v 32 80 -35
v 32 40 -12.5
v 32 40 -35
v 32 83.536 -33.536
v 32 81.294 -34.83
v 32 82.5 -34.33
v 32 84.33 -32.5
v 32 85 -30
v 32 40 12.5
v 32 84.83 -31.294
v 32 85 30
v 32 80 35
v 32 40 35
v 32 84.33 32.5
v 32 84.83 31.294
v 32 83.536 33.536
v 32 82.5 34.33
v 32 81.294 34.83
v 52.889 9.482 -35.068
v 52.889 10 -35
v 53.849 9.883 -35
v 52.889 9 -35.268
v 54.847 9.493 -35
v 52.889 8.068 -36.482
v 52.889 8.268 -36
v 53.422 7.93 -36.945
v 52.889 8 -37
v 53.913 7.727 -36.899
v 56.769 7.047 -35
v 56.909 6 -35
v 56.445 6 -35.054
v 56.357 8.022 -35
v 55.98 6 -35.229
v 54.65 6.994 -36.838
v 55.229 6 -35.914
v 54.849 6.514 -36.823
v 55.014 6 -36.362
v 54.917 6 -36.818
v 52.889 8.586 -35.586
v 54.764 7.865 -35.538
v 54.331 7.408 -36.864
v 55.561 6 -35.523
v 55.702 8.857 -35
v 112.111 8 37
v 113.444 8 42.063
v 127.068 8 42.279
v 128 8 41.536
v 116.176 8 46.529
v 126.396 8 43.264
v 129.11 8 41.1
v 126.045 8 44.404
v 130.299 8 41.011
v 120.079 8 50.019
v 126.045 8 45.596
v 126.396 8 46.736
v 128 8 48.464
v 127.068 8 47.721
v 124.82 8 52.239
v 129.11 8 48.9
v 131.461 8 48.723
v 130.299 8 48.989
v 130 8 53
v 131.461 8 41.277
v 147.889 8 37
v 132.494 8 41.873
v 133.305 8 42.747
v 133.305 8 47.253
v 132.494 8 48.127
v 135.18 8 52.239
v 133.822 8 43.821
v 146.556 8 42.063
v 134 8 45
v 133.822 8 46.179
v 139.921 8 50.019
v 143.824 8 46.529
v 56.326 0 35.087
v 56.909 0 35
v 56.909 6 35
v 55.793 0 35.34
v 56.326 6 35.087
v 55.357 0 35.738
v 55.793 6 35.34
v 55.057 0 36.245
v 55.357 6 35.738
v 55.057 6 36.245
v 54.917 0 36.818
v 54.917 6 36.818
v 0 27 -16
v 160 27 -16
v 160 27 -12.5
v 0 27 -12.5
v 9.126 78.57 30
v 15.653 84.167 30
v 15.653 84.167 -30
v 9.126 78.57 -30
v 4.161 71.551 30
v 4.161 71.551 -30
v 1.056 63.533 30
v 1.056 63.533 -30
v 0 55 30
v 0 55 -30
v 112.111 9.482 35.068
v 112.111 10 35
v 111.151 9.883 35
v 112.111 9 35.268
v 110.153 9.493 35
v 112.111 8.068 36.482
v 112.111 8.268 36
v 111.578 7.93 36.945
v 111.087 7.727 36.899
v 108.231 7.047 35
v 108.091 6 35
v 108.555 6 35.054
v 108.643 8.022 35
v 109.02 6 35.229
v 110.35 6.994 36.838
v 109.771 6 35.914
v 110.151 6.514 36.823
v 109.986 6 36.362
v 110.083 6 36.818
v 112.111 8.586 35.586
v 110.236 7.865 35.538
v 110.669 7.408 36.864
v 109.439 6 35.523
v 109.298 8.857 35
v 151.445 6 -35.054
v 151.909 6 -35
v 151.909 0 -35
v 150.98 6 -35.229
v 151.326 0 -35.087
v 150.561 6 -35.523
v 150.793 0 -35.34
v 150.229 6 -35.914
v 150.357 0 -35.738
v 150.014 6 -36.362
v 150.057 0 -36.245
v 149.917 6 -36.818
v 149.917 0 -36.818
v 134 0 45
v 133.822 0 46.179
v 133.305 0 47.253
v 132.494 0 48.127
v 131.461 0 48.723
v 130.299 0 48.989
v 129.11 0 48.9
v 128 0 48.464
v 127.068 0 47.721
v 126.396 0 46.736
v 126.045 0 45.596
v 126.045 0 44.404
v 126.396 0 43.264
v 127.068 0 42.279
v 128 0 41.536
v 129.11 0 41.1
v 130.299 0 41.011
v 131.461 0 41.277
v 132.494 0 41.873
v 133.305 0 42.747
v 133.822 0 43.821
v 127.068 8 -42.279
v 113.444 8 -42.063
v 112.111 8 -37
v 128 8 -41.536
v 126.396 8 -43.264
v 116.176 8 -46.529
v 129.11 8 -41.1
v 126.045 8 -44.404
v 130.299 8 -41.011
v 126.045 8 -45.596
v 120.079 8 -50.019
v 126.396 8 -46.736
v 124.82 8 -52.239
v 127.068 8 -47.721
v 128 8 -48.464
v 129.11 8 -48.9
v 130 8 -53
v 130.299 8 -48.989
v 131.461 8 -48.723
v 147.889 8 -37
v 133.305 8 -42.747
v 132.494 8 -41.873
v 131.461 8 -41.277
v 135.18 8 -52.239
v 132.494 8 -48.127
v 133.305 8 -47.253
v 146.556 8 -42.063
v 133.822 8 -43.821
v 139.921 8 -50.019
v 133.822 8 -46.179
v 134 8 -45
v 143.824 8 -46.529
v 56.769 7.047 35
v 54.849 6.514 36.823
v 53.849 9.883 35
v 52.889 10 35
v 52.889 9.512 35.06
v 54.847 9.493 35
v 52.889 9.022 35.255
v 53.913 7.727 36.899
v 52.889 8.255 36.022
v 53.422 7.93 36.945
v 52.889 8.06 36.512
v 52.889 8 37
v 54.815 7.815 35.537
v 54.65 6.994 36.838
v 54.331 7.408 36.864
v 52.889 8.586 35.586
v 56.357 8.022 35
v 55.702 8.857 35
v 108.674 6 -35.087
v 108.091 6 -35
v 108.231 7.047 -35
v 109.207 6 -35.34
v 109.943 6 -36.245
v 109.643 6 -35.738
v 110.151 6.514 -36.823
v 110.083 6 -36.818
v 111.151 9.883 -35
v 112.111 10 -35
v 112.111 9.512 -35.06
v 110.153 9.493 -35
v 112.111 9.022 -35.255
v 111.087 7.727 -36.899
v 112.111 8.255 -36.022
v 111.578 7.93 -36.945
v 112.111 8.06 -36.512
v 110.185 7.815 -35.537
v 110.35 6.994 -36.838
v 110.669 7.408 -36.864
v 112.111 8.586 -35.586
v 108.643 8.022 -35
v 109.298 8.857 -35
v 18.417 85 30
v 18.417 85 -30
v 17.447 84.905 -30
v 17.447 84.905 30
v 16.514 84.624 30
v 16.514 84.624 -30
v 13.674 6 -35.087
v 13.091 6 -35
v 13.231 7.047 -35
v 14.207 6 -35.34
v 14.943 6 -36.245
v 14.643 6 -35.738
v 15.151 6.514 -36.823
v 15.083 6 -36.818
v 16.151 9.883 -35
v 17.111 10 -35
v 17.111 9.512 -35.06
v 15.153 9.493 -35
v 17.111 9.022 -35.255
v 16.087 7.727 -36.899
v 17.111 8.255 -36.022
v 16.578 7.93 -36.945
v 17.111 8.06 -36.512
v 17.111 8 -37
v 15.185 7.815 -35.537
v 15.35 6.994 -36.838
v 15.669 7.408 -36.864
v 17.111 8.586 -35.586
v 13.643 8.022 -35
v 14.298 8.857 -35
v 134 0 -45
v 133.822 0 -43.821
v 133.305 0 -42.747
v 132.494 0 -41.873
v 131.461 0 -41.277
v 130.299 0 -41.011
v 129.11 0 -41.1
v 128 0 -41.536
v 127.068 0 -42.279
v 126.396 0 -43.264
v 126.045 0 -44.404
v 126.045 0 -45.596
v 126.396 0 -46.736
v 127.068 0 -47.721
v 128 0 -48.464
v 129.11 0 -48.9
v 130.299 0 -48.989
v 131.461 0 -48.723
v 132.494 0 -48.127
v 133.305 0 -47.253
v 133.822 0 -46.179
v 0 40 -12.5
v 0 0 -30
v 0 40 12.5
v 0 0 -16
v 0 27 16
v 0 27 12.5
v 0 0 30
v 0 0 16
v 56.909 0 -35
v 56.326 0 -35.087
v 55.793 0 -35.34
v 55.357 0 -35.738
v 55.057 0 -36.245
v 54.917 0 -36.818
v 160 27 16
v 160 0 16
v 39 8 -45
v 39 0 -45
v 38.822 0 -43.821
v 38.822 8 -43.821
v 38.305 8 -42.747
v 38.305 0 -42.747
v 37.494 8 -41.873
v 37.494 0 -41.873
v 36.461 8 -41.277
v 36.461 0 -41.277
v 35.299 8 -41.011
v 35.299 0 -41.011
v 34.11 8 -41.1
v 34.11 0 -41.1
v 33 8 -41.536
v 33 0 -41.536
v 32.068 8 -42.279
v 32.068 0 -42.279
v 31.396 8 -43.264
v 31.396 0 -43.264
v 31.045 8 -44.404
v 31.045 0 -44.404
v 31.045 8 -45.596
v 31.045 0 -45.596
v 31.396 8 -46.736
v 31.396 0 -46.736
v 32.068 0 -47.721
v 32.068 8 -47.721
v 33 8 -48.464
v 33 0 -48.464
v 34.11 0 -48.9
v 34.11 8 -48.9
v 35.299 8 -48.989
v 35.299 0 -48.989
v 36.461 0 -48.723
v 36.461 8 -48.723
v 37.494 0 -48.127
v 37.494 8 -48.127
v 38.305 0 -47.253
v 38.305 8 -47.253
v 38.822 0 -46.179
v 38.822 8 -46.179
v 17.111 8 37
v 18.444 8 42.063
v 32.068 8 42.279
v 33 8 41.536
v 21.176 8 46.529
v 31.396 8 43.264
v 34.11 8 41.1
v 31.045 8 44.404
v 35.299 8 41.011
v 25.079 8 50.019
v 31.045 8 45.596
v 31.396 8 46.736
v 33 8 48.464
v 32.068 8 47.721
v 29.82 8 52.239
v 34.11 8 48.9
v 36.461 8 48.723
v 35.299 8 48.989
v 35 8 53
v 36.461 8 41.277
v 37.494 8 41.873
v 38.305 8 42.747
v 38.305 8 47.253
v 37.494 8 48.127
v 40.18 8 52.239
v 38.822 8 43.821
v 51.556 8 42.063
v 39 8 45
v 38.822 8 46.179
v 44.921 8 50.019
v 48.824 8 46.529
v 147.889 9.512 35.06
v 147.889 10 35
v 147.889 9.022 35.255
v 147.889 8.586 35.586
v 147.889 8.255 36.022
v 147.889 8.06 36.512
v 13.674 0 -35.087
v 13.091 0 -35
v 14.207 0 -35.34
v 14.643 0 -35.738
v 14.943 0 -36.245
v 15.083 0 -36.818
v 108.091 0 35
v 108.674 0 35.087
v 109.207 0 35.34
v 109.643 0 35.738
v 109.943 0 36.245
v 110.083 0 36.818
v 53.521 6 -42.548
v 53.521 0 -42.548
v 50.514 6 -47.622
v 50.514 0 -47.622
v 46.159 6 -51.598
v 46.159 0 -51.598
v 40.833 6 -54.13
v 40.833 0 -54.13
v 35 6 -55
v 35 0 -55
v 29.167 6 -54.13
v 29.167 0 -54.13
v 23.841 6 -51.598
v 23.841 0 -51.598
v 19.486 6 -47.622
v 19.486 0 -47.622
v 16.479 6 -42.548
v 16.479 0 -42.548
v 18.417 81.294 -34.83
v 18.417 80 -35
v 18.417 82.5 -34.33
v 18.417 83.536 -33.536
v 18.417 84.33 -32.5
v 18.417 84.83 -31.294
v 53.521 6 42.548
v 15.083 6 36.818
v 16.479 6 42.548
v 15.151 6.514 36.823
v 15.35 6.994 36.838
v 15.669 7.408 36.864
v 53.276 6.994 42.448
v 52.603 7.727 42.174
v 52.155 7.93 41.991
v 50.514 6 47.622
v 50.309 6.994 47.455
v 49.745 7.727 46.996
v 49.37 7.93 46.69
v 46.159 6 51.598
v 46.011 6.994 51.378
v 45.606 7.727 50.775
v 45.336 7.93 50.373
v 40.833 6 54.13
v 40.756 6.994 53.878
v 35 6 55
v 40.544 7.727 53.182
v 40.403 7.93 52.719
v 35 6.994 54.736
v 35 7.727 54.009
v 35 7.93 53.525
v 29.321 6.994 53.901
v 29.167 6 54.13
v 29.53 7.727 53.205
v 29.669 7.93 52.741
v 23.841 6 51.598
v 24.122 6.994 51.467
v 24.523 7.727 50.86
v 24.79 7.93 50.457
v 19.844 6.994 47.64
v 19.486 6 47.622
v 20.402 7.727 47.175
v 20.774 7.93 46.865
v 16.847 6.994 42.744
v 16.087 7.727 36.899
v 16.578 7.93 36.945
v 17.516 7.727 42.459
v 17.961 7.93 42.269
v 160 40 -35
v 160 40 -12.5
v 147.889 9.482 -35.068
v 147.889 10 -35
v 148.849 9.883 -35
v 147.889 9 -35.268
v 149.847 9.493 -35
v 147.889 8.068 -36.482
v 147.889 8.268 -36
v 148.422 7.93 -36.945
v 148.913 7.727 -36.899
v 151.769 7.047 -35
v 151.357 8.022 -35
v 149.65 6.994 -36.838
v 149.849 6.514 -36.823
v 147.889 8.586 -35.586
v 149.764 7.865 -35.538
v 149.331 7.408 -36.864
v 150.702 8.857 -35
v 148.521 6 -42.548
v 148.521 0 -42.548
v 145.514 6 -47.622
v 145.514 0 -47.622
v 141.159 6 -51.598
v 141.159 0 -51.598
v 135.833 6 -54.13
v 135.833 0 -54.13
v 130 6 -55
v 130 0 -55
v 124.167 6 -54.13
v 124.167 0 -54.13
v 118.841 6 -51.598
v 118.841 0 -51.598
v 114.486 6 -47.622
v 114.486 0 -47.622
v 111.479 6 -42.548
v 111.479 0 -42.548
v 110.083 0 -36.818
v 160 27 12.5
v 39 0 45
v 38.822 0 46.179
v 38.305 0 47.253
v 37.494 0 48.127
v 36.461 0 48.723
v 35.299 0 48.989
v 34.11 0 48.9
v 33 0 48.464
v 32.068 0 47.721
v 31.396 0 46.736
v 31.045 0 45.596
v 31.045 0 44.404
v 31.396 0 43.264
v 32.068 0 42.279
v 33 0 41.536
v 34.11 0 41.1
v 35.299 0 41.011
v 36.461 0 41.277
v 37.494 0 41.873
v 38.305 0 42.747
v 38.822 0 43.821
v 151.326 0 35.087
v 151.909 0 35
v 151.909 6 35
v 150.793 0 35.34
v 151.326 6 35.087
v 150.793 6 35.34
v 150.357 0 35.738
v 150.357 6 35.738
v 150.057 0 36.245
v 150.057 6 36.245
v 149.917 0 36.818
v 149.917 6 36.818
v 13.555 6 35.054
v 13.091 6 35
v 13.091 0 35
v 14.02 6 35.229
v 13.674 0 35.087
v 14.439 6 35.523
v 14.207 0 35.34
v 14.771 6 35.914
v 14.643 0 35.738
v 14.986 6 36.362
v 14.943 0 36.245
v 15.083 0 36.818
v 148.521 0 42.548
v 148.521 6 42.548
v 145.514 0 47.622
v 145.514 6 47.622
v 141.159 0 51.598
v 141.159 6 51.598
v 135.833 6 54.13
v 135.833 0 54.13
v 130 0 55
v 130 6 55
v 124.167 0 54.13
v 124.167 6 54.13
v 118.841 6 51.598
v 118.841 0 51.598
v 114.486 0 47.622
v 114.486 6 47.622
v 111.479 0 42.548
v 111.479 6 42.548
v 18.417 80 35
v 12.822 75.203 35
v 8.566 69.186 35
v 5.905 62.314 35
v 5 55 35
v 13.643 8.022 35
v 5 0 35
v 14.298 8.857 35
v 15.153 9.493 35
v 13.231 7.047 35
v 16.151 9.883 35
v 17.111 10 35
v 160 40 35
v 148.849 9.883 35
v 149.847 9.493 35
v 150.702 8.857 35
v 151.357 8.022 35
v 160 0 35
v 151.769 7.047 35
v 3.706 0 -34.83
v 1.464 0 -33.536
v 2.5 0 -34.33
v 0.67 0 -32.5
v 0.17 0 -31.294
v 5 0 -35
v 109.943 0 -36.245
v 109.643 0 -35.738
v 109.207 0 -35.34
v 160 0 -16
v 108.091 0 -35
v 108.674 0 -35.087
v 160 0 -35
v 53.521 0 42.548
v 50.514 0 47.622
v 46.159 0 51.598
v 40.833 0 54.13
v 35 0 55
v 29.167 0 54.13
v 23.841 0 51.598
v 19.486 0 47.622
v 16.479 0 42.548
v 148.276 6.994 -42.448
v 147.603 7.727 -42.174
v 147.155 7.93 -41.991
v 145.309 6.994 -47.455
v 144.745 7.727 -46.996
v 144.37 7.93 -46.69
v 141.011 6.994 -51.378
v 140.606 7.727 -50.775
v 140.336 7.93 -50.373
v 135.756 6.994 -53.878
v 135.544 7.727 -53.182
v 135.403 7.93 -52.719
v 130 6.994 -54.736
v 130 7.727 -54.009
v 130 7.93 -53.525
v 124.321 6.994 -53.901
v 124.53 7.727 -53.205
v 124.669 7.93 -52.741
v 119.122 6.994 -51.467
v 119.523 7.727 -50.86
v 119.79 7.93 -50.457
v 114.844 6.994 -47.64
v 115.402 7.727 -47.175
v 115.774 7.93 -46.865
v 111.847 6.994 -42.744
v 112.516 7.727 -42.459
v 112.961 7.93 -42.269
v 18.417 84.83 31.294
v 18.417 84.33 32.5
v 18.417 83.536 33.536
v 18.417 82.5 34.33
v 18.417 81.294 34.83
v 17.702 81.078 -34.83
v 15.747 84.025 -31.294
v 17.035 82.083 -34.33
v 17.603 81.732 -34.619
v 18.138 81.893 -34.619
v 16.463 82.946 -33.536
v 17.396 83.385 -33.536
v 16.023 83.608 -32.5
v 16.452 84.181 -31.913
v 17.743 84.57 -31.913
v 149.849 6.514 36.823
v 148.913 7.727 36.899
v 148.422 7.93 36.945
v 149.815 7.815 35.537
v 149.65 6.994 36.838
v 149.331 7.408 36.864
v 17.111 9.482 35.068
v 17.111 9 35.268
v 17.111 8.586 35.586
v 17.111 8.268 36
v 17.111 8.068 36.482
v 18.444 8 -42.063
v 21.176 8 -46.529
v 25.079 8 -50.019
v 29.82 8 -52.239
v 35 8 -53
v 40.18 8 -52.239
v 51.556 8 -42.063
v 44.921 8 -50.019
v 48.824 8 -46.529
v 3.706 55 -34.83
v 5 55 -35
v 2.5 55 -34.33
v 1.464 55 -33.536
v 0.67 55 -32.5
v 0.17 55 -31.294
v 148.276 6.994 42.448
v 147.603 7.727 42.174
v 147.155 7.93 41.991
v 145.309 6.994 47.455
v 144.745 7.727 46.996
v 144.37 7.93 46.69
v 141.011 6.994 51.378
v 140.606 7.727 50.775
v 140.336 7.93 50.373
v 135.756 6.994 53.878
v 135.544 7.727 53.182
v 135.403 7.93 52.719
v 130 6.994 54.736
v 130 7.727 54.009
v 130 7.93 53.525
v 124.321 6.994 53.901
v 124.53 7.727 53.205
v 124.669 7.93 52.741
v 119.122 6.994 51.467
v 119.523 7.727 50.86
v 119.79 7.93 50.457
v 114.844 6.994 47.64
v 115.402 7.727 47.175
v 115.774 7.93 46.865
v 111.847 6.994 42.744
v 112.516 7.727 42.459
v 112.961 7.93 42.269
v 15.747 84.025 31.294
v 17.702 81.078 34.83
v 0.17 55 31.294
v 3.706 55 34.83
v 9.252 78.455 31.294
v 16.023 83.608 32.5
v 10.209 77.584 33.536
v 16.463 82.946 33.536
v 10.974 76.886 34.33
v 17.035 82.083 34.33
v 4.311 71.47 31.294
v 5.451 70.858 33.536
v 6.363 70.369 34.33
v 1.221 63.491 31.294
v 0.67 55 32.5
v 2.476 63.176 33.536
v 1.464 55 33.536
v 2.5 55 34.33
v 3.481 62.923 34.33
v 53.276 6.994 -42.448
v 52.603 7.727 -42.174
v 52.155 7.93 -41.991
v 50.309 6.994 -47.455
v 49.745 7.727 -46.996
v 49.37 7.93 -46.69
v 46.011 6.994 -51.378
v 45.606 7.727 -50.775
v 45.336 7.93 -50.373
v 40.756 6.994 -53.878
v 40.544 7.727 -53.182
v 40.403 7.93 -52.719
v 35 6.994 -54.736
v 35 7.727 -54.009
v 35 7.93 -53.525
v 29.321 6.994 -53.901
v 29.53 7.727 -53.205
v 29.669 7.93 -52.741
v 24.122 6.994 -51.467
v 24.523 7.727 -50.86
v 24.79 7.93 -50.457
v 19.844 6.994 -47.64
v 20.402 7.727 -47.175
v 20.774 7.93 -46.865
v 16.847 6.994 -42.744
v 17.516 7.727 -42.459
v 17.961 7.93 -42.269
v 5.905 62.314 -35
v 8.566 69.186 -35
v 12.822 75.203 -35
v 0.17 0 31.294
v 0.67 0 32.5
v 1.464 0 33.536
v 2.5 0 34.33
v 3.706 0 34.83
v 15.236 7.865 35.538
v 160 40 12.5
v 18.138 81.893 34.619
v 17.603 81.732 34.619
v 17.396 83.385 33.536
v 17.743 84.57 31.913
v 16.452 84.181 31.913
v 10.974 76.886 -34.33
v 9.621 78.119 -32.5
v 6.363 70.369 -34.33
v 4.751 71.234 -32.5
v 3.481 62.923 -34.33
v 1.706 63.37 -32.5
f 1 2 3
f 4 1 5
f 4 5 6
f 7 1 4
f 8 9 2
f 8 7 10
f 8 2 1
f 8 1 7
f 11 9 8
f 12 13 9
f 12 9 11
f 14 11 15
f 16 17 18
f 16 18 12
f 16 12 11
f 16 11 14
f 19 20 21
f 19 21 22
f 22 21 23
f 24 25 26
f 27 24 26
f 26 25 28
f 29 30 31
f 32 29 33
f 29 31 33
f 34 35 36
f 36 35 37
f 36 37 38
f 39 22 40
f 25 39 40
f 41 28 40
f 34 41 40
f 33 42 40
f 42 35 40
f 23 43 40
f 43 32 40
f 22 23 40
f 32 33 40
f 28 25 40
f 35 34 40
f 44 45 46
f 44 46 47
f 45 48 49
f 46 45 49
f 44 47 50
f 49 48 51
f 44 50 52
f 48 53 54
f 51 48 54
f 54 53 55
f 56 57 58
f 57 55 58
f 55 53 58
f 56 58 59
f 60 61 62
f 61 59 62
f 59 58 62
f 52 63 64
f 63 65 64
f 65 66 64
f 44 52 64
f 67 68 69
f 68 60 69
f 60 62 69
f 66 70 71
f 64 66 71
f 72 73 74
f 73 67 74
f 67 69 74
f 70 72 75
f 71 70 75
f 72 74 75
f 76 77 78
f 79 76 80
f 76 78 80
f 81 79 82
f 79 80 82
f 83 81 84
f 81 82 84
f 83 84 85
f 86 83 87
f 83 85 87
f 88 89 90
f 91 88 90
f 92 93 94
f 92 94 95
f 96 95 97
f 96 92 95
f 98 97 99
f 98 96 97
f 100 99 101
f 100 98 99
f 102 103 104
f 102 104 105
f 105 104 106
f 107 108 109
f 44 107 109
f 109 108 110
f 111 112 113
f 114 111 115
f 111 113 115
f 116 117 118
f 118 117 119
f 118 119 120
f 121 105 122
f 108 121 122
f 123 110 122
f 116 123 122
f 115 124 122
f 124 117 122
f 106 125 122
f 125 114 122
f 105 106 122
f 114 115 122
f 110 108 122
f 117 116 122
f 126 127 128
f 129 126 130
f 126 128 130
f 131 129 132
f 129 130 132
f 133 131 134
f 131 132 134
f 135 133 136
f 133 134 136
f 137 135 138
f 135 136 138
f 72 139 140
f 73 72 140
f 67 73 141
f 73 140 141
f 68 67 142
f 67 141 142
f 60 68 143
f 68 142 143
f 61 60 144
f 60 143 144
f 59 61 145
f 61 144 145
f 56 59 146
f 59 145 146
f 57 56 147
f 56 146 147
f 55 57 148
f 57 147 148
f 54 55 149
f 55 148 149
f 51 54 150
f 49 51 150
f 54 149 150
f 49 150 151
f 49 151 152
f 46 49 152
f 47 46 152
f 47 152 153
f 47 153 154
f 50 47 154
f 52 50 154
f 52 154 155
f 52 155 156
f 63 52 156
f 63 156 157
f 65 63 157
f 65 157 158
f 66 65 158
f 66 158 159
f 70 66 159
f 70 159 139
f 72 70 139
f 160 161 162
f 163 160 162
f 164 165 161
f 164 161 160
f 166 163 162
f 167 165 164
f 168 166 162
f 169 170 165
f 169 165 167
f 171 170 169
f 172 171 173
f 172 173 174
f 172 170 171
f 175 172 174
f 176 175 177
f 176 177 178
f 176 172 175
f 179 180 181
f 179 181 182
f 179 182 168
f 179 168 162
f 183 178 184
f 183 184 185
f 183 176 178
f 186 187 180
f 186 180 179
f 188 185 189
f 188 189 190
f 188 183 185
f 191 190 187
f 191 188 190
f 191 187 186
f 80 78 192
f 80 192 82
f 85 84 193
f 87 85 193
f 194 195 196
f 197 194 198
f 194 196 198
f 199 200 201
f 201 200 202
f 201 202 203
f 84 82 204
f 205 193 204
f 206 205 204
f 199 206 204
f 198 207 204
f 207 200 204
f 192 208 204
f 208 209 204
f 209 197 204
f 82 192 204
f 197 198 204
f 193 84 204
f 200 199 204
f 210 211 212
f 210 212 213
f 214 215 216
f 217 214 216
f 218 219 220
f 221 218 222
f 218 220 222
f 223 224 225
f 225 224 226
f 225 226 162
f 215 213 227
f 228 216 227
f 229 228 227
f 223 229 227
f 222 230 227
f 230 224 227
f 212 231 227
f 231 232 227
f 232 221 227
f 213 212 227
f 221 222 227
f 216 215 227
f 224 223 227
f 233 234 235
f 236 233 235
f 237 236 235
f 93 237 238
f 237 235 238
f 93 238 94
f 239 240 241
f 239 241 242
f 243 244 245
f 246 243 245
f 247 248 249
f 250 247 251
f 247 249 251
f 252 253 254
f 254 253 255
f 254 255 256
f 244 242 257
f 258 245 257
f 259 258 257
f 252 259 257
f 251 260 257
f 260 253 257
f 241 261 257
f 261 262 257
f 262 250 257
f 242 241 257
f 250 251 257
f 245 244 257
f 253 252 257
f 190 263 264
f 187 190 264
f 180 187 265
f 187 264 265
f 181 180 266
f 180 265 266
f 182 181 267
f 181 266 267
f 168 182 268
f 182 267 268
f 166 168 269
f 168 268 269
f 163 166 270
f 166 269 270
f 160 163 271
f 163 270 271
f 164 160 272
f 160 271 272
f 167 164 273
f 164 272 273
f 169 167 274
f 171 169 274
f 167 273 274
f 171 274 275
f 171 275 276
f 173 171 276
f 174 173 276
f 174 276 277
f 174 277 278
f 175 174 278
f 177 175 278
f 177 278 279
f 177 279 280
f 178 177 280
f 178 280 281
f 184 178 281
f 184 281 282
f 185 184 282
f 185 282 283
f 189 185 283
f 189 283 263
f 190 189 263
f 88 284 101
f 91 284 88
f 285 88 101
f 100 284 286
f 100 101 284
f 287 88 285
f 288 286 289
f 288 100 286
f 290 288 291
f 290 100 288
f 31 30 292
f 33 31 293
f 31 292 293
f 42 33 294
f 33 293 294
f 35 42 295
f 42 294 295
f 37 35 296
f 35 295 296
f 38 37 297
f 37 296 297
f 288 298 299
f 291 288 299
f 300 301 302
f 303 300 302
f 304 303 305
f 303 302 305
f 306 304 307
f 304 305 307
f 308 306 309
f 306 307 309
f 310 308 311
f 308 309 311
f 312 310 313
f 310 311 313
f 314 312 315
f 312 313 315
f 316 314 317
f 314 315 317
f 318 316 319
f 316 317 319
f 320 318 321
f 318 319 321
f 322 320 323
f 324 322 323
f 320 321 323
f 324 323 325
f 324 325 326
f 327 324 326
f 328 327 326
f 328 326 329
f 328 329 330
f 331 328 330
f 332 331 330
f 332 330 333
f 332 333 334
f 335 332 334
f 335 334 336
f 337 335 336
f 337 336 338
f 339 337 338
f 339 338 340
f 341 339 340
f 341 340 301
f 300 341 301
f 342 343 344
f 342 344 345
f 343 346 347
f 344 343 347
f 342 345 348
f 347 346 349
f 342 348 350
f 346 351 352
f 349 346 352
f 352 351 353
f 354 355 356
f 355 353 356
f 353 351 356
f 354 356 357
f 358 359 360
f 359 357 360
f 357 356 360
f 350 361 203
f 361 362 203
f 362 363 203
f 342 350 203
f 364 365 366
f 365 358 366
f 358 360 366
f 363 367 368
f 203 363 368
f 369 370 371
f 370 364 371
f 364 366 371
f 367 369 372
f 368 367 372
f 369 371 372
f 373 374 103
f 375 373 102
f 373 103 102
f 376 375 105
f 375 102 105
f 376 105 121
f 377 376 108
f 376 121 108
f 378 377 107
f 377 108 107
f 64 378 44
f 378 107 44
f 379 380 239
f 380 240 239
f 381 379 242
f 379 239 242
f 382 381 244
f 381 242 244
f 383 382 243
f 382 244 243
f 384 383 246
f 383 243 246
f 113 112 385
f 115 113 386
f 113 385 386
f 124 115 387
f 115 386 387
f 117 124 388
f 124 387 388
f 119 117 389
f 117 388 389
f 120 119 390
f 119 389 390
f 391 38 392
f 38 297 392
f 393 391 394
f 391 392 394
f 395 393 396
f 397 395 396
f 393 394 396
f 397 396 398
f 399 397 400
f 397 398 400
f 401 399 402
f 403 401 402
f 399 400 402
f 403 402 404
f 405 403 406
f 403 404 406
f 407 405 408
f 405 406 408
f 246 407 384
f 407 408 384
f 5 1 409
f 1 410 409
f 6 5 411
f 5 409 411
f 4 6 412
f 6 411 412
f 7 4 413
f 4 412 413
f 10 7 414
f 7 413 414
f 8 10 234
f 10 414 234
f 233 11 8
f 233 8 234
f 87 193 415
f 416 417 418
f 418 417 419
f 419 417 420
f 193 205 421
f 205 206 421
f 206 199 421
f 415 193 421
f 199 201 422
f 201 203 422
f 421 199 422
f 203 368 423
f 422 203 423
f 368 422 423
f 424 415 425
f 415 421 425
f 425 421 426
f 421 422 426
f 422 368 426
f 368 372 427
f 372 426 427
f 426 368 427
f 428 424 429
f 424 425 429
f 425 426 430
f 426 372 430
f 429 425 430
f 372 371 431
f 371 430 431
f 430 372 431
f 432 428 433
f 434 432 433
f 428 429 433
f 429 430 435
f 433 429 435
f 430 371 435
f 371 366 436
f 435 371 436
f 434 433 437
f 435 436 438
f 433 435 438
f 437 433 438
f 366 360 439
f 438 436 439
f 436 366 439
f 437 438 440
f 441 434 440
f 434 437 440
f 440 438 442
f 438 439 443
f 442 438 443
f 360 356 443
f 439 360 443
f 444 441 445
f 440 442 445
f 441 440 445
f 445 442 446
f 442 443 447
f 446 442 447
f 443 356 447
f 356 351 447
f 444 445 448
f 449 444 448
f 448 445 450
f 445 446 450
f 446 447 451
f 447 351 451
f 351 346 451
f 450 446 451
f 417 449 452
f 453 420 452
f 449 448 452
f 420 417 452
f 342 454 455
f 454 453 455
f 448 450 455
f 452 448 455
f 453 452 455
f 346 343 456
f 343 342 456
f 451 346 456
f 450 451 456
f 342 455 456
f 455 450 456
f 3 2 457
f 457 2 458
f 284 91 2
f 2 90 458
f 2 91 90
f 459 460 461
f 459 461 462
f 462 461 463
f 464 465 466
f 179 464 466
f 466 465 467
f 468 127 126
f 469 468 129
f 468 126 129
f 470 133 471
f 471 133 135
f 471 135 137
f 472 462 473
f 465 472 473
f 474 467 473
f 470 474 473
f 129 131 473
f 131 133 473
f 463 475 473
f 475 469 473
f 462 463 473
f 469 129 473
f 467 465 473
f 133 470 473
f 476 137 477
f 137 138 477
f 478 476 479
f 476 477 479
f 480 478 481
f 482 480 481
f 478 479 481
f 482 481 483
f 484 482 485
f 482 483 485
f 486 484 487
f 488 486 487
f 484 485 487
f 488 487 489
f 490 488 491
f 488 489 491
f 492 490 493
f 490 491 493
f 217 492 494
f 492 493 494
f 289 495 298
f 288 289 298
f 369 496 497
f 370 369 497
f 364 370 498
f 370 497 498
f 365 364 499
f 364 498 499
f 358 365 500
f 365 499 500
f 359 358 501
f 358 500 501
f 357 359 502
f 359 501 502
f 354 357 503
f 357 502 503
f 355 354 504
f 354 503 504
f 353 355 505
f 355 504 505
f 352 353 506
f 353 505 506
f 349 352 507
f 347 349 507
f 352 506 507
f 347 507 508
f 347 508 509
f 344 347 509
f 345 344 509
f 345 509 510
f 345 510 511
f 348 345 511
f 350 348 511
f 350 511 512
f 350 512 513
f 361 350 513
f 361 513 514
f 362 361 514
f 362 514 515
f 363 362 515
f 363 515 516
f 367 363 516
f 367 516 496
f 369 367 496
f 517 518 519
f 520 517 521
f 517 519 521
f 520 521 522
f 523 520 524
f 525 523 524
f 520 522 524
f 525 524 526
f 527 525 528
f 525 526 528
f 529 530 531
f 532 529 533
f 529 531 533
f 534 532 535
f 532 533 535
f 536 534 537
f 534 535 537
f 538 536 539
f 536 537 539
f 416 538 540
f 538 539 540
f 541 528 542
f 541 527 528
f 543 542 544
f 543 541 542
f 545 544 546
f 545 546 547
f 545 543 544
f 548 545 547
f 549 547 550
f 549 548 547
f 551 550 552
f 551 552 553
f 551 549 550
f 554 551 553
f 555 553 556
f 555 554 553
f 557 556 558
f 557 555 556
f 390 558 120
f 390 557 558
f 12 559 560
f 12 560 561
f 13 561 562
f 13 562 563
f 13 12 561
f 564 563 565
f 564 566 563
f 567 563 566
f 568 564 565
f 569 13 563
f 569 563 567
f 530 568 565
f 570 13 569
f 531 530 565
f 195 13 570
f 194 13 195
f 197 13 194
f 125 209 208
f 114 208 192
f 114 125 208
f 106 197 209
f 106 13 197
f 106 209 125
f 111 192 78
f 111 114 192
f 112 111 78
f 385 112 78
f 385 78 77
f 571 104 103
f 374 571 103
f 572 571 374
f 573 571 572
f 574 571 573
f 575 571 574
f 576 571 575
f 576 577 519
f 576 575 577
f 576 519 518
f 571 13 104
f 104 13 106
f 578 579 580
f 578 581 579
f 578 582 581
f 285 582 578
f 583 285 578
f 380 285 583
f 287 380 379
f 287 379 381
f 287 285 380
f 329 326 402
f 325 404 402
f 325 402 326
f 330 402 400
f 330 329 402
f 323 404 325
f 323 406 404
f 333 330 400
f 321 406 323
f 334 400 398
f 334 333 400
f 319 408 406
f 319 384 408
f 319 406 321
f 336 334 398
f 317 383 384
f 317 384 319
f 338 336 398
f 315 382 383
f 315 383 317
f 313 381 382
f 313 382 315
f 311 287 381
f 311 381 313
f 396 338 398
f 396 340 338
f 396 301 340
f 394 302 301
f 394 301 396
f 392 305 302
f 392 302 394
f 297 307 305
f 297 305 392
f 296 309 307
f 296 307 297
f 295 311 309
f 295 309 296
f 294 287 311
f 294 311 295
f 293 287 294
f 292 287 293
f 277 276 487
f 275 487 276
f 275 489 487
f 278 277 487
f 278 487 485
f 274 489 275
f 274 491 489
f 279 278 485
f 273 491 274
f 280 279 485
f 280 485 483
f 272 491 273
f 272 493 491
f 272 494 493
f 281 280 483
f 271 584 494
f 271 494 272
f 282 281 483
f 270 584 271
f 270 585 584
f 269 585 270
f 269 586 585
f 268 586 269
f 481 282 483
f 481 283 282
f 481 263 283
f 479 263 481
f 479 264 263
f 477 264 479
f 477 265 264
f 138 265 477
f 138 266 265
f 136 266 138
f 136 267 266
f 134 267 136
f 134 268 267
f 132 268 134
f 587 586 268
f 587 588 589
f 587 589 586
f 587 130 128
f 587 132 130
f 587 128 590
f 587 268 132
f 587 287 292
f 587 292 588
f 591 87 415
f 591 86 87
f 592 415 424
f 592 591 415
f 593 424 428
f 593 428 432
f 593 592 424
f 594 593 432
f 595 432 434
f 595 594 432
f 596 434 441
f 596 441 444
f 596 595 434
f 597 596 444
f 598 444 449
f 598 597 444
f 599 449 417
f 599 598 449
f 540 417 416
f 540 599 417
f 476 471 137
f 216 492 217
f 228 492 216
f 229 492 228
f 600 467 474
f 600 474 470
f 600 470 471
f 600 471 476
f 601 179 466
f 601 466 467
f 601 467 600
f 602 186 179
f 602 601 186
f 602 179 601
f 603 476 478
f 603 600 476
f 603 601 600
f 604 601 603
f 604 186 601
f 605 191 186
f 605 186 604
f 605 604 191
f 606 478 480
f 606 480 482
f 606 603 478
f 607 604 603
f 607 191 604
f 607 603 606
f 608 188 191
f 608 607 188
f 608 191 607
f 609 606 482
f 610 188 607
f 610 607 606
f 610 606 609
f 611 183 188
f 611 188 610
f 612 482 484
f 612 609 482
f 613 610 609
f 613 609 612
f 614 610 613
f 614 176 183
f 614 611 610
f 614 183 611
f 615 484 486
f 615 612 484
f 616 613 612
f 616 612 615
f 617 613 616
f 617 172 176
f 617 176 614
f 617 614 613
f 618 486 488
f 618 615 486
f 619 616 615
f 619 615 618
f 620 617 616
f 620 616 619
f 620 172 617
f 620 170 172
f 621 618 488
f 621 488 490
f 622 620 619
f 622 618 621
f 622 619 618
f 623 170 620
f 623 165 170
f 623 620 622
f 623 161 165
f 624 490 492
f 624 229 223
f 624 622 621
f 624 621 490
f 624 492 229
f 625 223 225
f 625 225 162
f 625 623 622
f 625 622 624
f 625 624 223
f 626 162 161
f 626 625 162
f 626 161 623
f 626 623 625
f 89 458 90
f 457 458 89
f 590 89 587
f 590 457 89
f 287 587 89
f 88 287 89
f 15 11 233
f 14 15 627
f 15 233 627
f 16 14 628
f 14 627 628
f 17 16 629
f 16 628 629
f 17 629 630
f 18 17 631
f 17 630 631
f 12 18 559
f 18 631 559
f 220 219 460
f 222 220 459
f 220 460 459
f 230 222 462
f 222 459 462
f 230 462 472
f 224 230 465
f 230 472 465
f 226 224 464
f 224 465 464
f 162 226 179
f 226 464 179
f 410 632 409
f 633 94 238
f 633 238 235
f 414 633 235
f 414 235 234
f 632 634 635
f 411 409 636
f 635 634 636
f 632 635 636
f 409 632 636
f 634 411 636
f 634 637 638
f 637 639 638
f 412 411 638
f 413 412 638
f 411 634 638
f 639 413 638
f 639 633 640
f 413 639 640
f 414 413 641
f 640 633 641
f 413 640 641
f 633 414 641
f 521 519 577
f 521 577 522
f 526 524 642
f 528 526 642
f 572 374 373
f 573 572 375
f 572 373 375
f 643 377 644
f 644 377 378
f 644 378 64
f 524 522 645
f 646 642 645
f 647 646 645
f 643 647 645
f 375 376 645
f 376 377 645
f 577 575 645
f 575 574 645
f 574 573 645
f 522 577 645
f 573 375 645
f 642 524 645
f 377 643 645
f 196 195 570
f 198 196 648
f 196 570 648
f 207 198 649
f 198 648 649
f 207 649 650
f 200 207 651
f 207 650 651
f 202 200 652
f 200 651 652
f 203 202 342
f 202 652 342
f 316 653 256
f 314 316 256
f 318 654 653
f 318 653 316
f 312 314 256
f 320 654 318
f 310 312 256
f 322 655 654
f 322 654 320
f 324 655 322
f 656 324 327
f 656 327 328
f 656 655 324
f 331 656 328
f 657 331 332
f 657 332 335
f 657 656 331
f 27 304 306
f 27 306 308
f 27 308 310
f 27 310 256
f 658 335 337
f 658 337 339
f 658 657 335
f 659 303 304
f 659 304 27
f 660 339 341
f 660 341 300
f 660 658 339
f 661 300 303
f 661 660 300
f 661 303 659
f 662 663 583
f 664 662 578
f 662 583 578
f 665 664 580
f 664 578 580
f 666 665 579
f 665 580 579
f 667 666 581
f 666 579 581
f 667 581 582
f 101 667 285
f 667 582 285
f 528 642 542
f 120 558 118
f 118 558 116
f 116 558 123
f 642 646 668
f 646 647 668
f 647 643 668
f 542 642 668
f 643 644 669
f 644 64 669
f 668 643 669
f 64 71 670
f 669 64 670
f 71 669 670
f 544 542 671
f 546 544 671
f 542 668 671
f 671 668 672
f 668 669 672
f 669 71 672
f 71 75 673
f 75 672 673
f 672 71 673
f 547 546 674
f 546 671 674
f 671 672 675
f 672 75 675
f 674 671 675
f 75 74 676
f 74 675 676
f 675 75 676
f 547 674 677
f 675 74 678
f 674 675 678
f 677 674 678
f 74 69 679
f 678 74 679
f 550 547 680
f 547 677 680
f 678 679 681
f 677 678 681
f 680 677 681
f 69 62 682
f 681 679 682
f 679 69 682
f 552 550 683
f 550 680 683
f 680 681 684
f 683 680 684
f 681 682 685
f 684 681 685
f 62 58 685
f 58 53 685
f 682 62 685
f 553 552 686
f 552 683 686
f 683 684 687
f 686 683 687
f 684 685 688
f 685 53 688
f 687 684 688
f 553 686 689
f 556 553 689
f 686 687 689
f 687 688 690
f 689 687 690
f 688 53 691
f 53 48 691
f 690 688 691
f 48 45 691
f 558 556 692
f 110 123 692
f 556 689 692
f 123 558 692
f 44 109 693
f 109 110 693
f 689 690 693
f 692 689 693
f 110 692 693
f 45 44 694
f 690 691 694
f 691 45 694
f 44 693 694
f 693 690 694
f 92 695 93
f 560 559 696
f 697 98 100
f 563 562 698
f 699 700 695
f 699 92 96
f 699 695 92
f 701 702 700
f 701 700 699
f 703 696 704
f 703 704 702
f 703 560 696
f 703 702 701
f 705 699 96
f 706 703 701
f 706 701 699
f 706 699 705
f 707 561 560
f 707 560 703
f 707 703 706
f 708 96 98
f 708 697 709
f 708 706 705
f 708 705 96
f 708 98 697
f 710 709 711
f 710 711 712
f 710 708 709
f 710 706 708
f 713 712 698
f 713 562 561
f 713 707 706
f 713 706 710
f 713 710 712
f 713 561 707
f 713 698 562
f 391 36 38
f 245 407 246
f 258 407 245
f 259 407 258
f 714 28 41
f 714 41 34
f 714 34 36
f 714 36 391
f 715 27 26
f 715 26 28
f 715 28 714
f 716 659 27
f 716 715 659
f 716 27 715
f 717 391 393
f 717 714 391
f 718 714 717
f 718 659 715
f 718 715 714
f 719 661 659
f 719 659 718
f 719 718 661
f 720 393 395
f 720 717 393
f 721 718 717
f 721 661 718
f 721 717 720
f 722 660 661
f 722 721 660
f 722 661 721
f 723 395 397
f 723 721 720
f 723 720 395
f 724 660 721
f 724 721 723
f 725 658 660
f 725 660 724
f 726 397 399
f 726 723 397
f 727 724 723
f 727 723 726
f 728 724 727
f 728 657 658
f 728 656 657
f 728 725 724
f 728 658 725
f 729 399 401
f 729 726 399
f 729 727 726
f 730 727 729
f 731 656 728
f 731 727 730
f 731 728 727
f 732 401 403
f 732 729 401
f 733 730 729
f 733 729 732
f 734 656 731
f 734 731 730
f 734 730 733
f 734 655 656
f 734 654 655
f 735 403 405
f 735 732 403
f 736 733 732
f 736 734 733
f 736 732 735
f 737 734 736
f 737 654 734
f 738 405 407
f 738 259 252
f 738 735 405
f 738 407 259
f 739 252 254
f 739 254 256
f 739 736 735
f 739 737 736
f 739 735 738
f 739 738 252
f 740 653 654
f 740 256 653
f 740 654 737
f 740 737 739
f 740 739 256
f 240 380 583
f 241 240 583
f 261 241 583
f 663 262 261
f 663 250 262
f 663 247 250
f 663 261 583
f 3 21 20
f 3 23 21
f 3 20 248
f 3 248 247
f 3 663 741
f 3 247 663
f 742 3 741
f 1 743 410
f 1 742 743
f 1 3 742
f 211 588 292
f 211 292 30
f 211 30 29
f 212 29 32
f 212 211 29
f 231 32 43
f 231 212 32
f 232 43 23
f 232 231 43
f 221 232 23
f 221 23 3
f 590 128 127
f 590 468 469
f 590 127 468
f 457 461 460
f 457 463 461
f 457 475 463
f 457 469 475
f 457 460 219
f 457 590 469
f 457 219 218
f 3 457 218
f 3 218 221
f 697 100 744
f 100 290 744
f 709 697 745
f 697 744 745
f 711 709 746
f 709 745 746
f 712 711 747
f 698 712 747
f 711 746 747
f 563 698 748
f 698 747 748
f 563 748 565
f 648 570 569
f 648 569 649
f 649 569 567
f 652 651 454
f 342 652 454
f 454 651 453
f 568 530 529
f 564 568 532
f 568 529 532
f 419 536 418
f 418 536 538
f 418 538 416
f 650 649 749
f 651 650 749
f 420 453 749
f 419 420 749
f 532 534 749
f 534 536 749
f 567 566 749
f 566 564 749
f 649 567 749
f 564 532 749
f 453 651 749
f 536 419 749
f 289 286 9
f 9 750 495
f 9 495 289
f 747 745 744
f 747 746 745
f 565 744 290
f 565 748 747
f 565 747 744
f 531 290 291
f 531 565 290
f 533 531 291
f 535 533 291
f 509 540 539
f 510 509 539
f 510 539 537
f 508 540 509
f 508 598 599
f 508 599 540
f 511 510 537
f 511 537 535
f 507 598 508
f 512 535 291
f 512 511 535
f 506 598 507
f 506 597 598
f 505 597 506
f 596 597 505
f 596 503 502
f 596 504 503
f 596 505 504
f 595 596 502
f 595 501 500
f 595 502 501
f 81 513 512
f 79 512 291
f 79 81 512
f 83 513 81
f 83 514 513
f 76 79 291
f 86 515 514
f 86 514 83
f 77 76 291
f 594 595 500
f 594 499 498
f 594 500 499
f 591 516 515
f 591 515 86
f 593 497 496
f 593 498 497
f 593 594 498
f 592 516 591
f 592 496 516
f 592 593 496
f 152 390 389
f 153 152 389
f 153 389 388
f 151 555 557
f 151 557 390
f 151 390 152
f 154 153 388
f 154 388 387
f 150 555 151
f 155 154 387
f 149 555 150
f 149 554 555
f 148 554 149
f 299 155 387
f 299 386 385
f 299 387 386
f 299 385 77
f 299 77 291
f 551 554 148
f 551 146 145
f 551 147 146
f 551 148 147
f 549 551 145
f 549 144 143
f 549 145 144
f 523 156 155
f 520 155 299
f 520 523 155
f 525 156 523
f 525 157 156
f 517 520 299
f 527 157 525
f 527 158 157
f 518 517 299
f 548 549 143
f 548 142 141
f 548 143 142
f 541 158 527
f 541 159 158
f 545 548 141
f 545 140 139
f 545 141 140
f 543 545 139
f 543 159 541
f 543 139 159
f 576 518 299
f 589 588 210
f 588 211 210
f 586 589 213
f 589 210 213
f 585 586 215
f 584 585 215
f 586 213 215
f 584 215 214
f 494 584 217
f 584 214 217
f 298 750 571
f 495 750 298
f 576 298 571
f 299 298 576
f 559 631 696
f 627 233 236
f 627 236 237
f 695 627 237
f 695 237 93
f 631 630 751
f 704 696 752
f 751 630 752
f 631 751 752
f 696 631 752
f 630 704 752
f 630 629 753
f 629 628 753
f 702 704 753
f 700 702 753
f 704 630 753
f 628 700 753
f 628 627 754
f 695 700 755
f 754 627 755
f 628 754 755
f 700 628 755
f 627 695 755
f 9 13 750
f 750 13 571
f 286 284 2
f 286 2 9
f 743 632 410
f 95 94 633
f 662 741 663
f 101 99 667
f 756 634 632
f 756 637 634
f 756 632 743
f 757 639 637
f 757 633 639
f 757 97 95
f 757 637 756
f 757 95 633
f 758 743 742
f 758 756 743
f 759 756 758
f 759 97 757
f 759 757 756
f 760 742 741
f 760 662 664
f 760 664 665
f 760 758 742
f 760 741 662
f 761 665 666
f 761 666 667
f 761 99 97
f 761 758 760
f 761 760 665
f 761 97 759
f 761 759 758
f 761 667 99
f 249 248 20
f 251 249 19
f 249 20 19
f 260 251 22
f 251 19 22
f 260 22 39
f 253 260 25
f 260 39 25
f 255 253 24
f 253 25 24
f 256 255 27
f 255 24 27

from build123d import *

# Parameters (mm, degrees)
SKETCH1_W                      = 185
SKETCH1_H                      = 40
EXTRUDE1_DEPTH                 = 35
EXTRUDE2_DEPTH                 = 70
EXTRUDE3_DEPTH                 = 25
CUT_EXTRUDE1_DEPTH             = 207.579282601
EXTRUDE4_DEPTH                 = 8
EXTRUDE5_DEPTH                 = 8
F_8_0_8_DIAMETER_HOLE1_D       = 8
F_14_0_14_DIAMETER_HOLE1_D     = 14
F_14_0_14_DIAMETER_HOLE1_DEPTH = 25
FILLET1_R                      = 2
FILLET2_R                      = 2
FILLET3_R                      = 2
FILLET10_R                     = 5
CUT_EXTRUDE2_DEPTH             = 223.598292936
CUT_EXTRUDE2_DEPTH_BACK        = 223.598292936


with BuildPart() as part:
    # Sketch1 → Extrude1 (new, symmetric)
    with BuildSketch(Plane.XY):
        with Locations((92.5, 20)):
            Rectangle(SKETCH1_W, SKETCH1_H)
    extrude(amount=EXTRUDE1_DEPTH, both=True)

    # Sketch2 → Extrude2 (add)
    with BuildSketch(Plane.XY.offset(35)):
        with BuildLine():
            Line((0, 40), (32, 40))
            Line((32, 40), (32, 85))
            Line((32, 85), (16.972243623, 85))
            ThreePointArc((16.972243623, 85), (4.537141687, 72.234101758), (0, 55))
            Line((0, 55), (0, 40))
        make_face()
    extrude(amount=-EXTRUDE2_DEPTH)

    # Sketch3 → Extrude3 (add)
    with BuildSketch(Plane(origin=(185, 0, 0), x_dir=(0, 0, -1), z_dir=(1, 0, 0))):
        with BuildLine():
            Line((-35, 40), (35, 40))
            Line((35, 40), (35, 55))
            Line((35, 55), (17, 55))
            ThreePointArc((17, 55), (0, 72), (-17, 55))
            Line((-17, 55), (-35, 55))
            Line((-35, 55), (-35, 40))
        make_face()
    extrude(amount=-EXTRUDE3_DEPTH)

    # Sketch4 → Cut-Extrude1 (cut, through all)
    with BuildSketch(Plane(origin=(185, 0, 0), x_dir=(0, 0, -1), z_dir=(1, 0, 0))):
        Polygon((-16, 0), (16, 0), (16, 27), (12.5, 27), (12.5, 40), (-12.5, 40), (-12.5, 27), (-16, 27), align=None)
    extrude(amount=-CUT_EXTRUDE1_DEPTH, mode=Mode.SUBTRACT)

    # Sketch5 → Extrude4 (add)
    with BuildSketch(Plane.XZ):
        with BuildLine():
            Line((15, 35), (55, 35))
            ThreePointArc((55, 35), (35, 55), (15, 35))
        make_face()
    extrude4 = extrude(amount=-EXTRUDE4_DEPTH)

    # Sketch6 → Extrude5 (add)
    with BuildSketch(Plane.XZ):
        with BuildLine():
            Line((110, 35), (150, 35))
            ThreePointArc((150, 35), (130, 55), (110, 35))
        make_face()
    extrude5 = extrude(amount=-EXTRUDE5_DEPTH)

    # Mirror1: Extrude4, Extrude5 across plane
    add(extrude4.mirror(Plane.XY))
    add(extrude5.mirror(Plane.XY))

    # Ø8.0 (8) Diameter Hole1 (through all)
    with Locations(Plane(origin=(0, 8, 0), x_dir=(-1, 0, 0), z_dir=(0, 1, 0))):
        with Locations((-35, 45), (-130, 45), (-35, -45), (-130, -45)):
            Hole(F_8_0_8_DIAMETER_HOLE1_D / 2)

    # Ø14.0 (14) Diameter Hole1
    with Locations(Plane(origin=(185, 0, 0), x_dir=(0, 0, -1), z_dir=(1, 0, 0))):
        with Locations((0, 55)):
            Hole(F_14_0_14_DIAMETER_HOLE1_D / 2, depth=F_14_0_14_DIAMETER_HOLE1_DEPTH)

    # Fillet1
    fillet1_edges = [part.edges().sort_by_distance(p)[0] for p in [
        (35, 8, -55),
        (130, 8, -55),
        (35, 8, 55),
        (130, 8, 55),
    ]]
    fillet(fillet1_edges, radius=FILLET1_R)

    # Fillet2
    fillet2_edges = [part.edges().sort_by_distance(p)[0] for p in [
        (130, 8, -35),
        (150, 3, -35),
        (110, 3, -35),
        (35, 8, -35),
        (15, 3, -35),
        (55, 3, -35),
        (150, 3, 35),
        (110, 3, 35),
        (130, 8, 35),
        (55, 3, 35),
        (15, 3, 35),
        (35, 8, 35),
        (110.585786438, 7.414213562, -35),
        (149.414213562, 7.414213562, -35),
        (15.585786438, 7.414213562, -35),
        (54.414213562, 7.414213562, -35),
        (110.585786438, 7.414213562, 35),
        (149.414213562, 7.414213562, 35),
        (15.585786438, 7.414213562, 35),
        (54.414213562, 7.414213562, 35),
        (172.5, 55, 35),
        (172.5, 55, 17),
        (172.5, 55, -17),
        (172.5, 55, -35),
    ]]
    fillet(fillet2_edges, radius=FILLET2_R)

    # Fillet3
    fillet3_edges = [part.edges().sort_by_distance(p)[0] for p in [
        (185, 26.5, 35),
        (185, 55, 25.947221814),
        (185, 55, -25.947221814),
        (185, 72, 0),
        (185, 54.414213562, -34.414213562),
        (185, 54.414213562, 34.414213562),
        (185, 55.513216117, -17.55673152),
        (185, 55.513216117, 17.55673152),
        (185, 26.5, -35),
    ]]
    fillet(fillet3_edges, radius=FILLET3_R)

    # Fillet10
    fillet10_edges = [part.edges().sort_by_distance(p)[0] for p in [
        (4.537141687, 72.234101758, -35),
        (24.486121811, 85, -35),
        (16.972243623, 85, 0),
        (24.486121811, 85, 35),
        (4.537141687, 72.234101758, 35),
        (0, 27.5, 35),
        (0, 27.5, -35),
    ]]
    fillet(fillet10_edges, radius=FILLET10_R)

    # Sketch12 → Cut-Extrude2 (cut, two sides: drawn at the far end of the back side and taken through both)
    with BuildSketch(Plane.XY.offset(35).offset(-CUT_EXTRUDE2_DEPTH_BACK)):
        Polygon((160, 475.924423606), (160, 86.777149485), (160, -16.676761693), (160, -405.824035814), (938.294548242, -405.824035814), (938.294548242, 475.924423606), align=None)
    extrude(amount=CUT_EXTRUDE2_DEPTH + CUT_EXTRUDE2_DEPTH_BACK, mode=Mode.SUBTRACT)


solid = part.part
